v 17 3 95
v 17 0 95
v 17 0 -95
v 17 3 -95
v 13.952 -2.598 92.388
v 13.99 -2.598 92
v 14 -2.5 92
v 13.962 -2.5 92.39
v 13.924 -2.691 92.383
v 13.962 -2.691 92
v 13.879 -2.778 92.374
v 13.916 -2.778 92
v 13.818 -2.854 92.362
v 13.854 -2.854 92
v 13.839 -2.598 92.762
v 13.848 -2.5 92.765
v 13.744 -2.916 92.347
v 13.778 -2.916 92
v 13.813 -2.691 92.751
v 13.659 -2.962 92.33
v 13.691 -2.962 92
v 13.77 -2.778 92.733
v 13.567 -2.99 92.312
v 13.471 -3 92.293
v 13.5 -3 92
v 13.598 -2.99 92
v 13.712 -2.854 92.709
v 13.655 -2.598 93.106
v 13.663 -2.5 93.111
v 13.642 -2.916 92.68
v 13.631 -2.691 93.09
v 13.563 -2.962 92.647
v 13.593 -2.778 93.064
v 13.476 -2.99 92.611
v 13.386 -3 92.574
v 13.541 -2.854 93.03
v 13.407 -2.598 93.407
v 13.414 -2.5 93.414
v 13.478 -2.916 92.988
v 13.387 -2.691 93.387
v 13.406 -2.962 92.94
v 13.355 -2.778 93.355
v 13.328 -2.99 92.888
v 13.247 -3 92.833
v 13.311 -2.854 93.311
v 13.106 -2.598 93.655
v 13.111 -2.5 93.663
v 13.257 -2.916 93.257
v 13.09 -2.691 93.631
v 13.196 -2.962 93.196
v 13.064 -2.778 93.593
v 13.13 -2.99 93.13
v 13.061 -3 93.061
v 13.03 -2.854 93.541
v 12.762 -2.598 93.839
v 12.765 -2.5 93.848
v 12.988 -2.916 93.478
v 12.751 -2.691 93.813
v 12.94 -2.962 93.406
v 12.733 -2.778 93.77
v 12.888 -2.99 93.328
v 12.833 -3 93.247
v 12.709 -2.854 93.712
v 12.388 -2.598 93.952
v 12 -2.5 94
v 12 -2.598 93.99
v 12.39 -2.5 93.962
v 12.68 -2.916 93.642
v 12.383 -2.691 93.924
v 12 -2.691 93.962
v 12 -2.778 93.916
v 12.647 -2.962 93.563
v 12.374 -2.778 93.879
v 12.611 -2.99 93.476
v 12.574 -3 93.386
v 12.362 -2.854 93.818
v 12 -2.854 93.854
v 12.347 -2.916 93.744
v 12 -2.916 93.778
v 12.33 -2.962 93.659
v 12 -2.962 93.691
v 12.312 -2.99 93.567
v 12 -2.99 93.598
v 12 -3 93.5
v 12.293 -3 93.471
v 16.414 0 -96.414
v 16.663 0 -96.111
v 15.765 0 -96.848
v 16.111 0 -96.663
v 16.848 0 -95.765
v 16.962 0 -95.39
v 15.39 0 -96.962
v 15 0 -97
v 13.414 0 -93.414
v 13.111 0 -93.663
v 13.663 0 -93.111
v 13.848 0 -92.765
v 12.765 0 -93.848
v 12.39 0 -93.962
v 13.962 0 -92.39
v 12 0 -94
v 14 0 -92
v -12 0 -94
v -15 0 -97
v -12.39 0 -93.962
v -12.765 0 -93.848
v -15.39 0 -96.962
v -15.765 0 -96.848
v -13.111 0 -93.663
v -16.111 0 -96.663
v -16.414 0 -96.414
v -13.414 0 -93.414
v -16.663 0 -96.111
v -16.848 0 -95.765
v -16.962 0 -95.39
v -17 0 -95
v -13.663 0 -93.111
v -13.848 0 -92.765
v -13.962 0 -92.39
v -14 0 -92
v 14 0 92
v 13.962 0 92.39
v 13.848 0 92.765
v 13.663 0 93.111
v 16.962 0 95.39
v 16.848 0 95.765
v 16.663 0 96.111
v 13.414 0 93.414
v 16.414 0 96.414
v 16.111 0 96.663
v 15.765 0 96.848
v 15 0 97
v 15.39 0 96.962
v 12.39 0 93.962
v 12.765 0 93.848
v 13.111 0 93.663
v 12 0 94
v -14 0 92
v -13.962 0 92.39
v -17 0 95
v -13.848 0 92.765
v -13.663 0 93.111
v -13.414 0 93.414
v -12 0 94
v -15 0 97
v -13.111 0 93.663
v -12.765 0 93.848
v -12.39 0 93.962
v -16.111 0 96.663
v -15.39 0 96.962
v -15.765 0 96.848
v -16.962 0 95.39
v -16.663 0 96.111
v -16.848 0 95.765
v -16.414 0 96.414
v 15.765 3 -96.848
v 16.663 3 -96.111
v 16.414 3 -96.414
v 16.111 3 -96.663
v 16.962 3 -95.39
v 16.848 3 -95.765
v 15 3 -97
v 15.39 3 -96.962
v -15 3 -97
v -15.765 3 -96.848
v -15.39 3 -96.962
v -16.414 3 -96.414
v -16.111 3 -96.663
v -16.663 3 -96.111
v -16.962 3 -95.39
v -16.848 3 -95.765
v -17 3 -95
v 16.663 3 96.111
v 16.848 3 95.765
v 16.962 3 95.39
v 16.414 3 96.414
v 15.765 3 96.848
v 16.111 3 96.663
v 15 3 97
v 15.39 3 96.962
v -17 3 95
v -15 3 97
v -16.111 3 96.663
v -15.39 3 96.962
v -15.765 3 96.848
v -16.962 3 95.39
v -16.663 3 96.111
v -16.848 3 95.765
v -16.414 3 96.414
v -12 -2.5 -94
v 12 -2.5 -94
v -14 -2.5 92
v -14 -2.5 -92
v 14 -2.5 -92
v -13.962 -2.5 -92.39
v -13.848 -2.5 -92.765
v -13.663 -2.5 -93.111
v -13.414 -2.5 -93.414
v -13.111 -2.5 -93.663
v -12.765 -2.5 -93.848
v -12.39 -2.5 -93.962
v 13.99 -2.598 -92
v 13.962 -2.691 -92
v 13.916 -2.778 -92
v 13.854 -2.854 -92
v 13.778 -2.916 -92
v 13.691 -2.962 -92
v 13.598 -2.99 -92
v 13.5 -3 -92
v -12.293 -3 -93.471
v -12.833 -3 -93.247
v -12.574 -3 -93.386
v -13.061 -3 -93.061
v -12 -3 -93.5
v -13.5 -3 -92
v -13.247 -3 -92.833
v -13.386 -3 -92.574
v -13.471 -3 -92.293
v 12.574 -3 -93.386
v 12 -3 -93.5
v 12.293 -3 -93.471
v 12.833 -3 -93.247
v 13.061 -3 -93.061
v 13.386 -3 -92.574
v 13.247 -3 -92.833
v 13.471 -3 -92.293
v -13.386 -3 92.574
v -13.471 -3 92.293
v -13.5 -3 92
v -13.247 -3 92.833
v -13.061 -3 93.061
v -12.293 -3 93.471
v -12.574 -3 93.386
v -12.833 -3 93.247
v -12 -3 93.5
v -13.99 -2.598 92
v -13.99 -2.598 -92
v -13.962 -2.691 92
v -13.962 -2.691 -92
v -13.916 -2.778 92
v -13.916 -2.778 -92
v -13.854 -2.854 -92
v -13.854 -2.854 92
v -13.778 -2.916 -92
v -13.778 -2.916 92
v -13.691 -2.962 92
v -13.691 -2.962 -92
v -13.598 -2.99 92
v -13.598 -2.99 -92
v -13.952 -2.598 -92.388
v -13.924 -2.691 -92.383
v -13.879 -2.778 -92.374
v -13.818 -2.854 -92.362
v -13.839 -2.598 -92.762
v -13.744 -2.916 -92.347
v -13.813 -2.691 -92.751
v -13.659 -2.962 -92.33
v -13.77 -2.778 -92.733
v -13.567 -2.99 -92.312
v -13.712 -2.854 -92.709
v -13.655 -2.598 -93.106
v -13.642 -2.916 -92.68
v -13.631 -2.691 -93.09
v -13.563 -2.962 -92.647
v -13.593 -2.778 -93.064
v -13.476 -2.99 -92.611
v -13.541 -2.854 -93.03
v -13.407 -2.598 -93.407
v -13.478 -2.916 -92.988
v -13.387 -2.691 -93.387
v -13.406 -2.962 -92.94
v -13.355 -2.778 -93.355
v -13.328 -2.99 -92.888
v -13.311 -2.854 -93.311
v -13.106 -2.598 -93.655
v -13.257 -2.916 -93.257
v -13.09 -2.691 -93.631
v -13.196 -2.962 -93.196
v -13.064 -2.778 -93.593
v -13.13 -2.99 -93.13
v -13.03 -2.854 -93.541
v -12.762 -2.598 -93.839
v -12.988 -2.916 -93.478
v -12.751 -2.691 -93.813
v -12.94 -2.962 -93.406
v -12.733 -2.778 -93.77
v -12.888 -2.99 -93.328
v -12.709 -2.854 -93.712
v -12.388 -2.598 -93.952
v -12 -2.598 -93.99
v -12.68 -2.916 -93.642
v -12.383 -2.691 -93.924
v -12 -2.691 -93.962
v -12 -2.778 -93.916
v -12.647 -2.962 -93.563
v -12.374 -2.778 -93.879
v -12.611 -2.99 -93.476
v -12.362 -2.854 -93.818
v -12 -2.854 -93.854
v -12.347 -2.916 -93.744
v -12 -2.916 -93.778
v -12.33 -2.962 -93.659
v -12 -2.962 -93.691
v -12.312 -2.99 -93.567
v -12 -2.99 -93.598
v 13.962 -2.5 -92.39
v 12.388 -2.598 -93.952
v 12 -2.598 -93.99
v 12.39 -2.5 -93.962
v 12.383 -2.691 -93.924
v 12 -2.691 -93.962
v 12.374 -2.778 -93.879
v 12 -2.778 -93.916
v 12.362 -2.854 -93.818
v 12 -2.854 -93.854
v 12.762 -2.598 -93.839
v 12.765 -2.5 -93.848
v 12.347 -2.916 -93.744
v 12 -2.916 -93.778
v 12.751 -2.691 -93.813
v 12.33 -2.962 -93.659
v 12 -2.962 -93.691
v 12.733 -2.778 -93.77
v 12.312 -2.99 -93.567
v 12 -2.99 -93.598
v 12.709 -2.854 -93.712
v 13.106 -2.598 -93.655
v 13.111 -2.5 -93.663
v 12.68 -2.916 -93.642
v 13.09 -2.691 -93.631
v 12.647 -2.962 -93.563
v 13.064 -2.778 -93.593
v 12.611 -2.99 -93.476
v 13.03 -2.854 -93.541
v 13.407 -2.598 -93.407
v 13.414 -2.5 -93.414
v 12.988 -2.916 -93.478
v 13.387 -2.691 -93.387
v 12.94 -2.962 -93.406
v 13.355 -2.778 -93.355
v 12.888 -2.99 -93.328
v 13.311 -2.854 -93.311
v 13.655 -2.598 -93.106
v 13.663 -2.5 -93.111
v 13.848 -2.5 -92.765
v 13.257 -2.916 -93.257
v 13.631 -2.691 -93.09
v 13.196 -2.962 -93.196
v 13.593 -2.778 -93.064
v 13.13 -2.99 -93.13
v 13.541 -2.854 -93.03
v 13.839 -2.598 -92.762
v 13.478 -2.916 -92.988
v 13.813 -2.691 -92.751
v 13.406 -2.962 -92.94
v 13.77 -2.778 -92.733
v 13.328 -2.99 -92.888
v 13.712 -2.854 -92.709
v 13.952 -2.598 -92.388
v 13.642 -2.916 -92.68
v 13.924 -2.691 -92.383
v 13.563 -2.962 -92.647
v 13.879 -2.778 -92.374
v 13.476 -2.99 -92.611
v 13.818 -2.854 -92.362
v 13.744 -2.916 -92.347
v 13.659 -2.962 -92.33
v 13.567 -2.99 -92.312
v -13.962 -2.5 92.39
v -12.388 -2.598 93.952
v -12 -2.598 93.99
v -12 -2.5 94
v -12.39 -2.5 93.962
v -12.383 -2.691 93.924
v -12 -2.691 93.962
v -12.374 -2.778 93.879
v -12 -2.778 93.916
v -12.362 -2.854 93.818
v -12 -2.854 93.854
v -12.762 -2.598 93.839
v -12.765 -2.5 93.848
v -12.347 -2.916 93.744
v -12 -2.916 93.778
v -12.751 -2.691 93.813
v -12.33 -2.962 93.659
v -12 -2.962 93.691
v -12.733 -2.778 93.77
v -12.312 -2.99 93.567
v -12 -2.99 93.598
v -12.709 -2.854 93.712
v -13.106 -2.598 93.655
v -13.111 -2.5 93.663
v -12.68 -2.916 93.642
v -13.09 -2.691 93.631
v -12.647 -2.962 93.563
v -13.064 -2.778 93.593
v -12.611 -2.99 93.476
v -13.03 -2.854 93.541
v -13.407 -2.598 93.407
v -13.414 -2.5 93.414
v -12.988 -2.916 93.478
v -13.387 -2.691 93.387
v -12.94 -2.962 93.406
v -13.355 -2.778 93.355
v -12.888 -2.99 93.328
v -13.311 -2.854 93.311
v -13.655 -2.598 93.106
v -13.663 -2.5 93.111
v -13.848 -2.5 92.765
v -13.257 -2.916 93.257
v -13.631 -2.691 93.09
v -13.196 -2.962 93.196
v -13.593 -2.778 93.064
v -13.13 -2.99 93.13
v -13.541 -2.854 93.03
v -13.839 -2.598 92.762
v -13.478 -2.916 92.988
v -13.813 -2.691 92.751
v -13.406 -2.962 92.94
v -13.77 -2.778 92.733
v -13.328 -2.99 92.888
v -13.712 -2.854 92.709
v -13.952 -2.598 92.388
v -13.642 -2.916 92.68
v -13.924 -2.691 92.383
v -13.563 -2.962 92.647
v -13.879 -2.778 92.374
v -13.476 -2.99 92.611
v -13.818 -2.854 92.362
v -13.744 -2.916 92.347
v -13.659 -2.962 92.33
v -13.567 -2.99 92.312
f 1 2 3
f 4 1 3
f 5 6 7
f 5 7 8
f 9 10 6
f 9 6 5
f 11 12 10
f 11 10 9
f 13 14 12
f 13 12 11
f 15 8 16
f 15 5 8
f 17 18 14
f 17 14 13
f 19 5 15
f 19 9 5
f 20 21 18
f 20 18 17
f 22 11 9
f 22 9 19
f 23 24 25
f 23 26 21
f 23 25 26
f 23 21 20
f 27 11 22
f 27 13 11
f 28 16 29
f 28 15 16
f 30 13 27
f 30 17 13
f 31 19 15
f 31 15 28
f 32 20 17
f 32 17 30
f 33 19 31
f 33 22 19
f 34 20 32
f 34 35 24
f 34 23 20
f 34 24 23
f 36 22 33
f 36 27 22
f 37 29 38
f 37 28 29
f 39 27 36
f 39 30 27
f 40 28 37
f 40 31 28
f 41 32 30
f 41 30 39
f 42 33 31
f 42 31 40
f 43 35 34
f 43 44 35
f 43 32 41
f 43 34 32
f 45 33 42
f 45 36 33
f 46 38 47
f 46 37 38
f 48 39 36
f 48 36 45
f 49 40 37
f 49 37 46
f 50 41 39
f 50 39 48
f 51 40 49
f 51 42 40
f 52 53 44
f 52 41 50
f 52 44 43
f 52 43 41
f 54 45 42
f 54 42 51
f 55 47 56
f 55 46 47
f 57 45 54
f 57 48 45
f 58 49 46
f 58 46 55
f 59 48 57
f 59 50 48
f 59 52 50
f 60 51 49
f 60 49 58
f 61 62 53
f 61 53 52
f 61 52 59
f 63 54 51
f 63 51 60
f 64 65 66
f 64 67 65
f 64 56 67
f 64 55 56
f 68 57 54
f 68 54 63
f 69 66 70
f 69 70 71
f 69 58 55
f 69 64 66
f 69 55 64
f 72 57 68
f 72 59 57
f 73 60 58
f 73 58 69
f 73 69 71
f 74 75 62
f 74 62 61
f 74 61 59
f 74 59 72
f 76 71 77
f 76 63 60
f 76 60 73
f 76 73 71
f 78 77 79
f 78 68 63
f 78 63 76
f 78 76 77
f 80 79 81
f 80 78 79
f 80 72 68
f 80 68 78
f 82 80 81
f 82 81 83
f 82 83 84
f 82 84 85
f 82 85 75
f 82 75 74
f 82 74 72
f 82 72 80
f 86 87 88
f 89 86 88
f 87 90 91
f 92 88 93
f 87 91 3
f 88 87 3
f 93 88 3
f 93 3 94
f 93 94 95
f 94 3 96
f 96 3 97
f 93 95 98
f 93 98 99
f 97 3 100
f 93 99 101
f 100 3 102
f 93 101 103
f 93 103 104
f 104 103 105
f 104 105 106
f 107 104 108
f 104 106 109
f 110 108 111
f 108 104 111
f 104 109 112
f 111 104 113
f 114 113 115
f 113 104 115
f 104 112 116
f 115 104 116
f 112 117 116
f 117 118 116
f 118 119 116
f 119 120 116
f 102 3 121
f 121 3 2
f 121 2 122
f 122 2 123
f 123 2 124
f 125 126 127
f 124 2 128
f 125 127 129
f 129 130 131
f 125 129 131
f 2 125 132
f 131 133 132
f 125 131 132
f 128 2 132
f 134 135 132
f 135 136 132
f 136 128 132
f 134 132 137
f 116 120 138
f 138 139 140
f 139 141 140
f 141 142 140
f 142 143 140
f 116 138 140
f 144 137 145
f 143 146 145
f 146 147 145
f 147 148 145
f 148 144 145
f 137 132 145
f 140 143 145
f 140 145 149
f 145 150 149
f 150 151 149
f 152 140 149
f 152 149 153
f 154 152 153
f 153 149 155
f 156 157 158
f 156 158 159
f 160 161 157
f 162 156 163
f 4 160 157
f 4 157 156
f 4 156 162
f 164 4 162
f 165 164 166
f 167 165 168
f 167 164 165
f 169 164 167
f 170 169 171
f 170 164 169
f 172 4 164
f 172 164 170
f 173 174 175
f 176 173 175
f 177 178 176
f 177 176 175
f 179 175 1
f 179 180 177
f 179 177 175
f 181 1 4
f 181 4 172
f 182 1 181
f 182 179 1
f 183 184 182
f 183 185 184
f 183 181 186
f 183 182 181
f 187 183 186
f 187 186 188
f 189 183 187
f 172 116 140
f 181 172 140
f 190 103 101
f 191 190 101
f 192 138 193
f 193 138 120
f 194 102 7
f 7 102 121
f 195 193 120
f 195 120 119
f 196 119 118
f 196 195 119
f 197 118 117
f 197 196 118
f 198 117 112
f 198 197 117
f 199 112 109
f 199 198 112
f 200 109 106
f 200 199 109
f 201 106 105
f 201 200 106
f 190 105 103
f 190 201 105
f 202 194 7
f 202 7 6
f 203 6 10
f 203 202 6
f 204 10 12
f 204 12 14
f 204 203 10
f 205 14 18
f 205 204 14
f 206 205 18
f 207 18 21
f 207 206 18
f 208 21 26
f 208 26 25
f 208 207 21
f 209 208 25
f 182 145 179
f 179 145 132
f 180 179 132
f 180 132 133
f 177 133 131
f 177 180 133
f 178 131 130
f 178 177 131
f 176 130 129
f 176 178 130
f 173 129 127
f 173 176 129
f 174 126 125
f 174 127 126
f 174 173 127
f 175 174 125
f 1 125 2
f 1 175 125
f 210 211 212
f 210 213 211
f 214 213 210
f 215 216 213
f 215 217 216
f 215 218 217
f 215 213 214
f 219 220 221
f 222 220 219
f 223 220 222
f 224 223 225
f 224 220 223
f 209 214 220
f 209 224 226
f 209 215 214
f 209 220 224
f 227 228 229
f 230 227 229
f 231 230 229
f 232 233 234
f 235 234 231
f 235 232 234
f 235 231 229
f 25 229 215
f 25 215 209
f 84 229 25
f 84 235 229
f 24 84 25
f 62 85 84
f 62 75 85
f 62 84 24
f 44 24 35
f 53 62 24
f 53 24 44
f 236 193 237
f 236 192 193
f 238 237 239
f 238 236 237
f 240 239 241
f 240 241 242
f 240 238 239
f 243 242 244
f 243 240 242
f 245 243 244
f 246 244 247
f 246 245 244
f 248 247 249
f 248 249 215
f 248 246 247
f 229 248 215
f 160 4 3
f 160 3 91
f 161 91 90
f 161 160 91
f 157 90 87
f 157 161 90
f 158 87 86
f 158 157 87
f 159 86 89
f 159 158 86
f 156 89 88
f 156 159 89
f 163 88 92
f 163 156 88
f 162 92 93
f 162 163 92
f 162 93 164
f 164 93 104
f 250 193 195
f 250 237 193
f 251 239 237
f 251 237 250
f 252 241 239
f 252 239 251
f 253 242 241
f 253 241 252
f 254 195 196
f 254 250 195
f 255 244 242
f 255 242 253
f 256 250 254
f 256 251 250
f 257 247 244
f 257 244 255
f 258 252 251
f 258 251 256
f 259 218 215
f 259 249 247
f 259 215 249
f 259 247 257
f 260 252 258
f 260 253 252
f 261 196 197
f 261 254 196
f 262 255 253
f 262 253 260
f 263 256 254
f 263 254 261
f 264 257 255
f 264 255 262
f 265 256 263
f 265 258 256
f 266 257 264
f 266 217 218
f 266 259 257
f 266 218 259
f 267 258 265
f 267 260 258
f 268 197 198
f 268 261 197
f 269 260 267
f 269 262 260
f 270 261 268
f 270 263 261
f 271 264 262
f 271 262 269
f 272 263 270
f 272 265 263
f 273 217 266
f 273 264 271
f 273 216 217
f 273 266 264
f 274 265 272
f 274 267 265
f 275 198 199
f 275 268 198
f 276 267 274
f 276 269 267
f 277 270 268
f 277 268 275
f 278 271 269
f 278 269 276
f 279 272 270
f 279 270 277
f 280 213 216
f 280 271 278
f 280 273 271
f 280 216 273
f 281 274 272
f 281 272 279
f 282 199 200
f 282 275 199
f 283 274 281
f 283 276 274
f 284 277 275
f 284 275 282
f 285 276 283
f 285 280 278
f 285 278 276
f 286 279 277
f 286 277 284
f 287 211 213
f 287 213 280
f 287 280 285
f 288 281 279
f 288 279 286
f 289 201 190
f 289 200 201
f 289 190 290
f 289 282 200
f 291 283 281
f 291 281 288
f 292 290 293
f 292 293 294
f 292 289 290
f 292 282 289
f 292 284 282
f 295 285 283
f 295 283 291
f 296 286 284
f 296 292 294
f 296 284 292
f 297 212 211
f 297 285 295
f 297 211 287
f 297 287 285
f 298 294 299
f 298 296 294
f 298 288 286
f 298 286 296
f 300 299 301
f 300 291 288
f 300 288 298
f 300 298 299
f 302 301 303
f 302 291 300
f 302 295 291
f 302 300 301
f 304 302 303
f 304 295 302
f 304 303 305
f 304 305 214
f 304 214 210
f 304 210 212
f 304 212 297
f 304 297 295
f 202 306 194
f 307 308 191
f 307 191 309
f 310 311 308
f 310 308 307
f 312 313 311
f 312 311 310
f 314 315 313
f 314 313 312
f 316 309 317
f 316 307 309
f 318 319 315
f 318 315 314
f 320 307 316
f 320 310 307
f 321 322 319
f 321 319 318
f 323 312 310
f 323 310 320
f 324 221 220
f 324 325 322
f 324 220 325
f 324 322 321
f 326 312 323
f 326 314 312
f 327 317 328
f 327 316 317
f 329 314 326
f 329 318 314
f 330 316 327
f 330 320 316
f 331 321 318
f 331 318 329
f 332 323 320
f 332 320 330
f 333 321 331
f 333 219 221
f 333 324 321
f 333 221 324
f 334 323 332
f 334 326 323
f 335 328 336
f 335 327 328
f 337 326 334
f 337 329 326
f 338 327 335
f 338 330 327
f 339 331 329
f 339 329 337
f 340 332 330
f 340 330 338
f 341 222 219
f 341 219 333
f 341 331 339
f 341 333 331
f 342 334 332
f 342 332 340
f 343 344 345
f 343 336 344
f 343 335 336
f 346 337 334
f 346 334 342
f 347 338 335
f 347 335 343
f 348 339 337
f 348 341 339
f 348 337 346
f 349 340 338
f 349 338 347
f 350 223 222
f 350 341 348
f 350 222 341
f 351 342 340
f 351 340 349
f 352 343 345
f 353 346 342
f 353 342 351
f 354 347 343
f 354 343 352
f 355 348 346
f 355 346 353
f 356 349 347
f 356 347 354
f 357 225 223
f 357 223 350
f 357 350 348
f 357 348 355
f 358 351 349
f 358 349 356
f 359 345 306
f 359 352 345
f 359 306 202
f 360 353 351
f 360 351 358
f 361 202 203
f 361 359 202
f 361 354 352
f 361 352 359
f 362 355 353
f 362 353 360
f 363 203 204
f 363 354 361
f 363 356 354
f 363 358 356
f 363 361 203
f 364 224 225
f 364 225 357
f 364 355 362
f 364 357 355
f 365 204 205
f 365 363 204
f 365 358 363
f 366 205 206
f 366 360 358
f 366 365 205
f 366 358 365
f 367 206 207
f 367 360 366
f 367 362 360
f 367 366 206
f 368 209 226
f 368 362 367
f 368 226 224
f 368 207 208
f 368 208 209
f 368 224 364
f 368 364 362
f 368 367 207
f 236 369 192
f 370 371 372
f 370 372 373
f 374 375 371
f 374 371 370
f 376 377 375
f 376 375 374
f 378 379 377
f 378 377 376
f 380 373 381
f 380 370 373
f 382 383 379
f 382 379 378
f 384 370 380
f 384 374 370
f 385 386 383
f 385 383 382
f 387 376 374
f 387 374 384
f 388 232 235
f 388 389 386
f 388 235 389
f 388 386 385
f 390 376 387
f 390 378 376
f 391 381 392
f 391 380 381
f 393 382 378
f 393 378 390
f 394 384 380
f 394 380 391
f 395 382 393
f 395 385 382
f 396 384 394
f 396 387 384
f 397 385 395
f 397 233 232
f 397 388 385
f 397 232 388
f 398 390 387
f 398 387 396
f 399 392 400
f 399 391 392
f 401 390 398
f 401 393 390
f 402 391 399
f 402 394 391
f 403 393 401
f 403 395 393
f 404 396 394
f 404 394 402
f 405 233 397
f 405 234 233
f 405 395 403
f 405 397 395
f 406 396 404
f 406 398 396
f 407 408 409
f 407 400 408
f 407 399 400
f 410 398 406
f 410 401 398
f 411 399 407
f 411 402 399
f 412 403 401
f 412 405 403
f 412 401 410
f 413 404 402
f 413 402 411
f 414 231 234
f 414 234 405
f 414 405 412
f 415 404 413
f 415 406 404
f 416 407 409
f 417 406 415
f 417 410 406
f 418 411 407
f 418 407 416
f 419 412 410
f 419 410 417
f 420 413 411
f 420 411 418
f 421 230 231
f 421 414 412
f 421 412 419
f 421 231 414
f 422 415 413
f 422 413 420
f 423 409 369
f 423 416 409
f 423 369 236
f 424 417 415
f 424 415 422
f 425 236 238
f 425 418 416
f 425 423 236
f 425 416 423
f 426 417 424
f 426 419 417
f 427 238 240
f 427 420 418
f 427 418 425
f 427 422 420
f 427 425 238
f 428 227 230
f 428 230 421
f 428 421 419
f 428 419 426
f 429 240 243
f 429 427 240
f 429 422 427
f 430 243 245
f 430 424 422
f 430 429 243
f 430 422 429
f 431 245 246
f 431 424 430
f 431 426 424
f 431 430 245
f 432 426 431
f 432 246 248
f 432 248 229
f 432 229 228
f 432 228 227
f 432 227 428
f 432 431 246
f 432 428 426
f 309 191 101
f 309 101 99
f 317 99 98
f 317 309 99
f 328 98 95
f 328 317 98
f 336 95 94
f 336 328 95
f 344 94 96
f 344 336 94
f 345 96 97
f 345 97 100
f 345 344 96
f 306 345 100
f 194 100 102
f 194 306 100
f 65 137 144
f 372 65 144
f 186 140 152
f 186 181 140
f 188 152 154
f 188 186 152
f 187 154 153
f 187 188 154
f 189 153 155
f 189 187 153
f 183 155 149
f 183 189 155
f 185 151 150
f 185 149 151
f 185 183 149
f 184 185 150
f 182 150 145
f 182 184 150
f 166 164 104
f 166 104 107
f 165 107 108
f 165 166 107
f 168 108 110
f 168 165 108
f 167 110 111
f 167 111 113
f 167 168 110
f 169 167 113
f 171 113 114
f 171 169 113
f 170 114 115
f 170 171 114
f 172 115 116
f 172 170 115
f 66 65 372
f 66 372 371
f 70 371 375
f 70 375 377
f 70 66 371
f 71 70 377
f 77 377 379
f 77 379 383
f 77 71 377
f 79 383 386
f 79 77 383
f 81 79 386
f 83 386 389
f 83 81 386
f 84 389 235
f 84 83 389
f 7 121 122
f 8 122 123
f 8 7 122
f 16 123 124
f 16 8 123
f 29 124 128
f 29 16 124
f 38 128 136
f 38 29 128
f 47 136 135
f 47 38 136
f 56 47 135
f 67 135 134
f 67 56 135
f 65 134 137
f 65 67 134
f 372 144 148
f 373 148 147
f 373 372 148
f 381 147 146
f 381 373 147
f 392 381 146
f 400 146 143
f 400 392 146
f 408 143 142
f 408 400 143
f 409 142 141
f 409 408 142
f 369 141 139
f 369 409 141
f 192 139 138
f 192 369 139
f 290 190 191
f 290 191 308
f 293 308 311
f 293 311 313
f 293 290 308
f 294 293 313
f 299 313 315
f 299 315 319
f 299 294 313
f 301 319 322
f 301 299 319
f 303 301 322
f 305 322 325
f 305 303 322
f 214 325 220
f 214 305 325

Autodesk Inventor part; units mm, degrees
ref_plane "YZ Plane" through (0, 0, 0) normal (1, 0, 0) x (0, 1, 0)
ref_plane "XZ Plane" through (0, 0, 0) normal (0, 1, 0) x (-1, 0, 0)
ref_plane "XY Plane" through (0, 0, 0) normal (0, 0, 1) x (1, 0, 0)
sketch "Sketch1" plane through (0, 0, 0) normal (0, 1, 0) x (-1, 0, 0)
  line L0 (-17, -97) -> (17, -97)
  line L1 (17, -97) -> (17, 97)
  line L2 (17, 97) -> (-17, 97)
  line L3 (-17, 97) -> (-17, -97)
  line L4 (-17, -97) -> (17, 97) construction
  line L5 (17, -97) -> (-17, 97) construction
  point P0 (0, 0)
  dimension "d0" = 34
  dimension "d1" = 194
extrude "Extrusion1" add sketch "Sketch1" along normal blind 3
sketch "Sketch2" plane through (0, 0, 0) normal (0, -1, 0) x (1, 0, 0)
  line L0 (14, 94) -> (-14, 94)
  line L1 (-14, 94) -> (-14, -94)
  line L2 (-14, -94) -> (14, -94)
  line L3 (14, -94) -> (14, 94)
  line L4 (14, 94) -> (-14, -94) construction
  line L5 (-14, 94) -> (14, -94) construction
  line L6 (-17, -97) -> (-17, 97) projected
  line L7 (17, -97) -> (-17, -97) projected
  point P0 (0, 0)
  dimension "d4" = 3
  dimension "d5" = 3
extrude "Extrusion2" add sketch "Sketch2" along normal blind 3
fillet "Fillet1" radius 2 8 edges at (17, 1.5, 97) (14, -1.5, 94) (-14, -1.5, 94) (-17, 1.5, 97) (14, -1.5, -94) (17, 1.5, -97) (-17, 1.5, -97) (-14, -1.5, -94)
fillet "Fillet2" radius 0.5 8 edges at (-13.4142, -3, 93.4142) (-14, -3, 0) (-13.4142, -3, -93.4142) (0, -3, -94) (13.4142, -3, -93.4142) (14, -3, 0) (13.4142, -3, 93.4142) (0, -3, 94)
properties part number "module-lid_switch"
